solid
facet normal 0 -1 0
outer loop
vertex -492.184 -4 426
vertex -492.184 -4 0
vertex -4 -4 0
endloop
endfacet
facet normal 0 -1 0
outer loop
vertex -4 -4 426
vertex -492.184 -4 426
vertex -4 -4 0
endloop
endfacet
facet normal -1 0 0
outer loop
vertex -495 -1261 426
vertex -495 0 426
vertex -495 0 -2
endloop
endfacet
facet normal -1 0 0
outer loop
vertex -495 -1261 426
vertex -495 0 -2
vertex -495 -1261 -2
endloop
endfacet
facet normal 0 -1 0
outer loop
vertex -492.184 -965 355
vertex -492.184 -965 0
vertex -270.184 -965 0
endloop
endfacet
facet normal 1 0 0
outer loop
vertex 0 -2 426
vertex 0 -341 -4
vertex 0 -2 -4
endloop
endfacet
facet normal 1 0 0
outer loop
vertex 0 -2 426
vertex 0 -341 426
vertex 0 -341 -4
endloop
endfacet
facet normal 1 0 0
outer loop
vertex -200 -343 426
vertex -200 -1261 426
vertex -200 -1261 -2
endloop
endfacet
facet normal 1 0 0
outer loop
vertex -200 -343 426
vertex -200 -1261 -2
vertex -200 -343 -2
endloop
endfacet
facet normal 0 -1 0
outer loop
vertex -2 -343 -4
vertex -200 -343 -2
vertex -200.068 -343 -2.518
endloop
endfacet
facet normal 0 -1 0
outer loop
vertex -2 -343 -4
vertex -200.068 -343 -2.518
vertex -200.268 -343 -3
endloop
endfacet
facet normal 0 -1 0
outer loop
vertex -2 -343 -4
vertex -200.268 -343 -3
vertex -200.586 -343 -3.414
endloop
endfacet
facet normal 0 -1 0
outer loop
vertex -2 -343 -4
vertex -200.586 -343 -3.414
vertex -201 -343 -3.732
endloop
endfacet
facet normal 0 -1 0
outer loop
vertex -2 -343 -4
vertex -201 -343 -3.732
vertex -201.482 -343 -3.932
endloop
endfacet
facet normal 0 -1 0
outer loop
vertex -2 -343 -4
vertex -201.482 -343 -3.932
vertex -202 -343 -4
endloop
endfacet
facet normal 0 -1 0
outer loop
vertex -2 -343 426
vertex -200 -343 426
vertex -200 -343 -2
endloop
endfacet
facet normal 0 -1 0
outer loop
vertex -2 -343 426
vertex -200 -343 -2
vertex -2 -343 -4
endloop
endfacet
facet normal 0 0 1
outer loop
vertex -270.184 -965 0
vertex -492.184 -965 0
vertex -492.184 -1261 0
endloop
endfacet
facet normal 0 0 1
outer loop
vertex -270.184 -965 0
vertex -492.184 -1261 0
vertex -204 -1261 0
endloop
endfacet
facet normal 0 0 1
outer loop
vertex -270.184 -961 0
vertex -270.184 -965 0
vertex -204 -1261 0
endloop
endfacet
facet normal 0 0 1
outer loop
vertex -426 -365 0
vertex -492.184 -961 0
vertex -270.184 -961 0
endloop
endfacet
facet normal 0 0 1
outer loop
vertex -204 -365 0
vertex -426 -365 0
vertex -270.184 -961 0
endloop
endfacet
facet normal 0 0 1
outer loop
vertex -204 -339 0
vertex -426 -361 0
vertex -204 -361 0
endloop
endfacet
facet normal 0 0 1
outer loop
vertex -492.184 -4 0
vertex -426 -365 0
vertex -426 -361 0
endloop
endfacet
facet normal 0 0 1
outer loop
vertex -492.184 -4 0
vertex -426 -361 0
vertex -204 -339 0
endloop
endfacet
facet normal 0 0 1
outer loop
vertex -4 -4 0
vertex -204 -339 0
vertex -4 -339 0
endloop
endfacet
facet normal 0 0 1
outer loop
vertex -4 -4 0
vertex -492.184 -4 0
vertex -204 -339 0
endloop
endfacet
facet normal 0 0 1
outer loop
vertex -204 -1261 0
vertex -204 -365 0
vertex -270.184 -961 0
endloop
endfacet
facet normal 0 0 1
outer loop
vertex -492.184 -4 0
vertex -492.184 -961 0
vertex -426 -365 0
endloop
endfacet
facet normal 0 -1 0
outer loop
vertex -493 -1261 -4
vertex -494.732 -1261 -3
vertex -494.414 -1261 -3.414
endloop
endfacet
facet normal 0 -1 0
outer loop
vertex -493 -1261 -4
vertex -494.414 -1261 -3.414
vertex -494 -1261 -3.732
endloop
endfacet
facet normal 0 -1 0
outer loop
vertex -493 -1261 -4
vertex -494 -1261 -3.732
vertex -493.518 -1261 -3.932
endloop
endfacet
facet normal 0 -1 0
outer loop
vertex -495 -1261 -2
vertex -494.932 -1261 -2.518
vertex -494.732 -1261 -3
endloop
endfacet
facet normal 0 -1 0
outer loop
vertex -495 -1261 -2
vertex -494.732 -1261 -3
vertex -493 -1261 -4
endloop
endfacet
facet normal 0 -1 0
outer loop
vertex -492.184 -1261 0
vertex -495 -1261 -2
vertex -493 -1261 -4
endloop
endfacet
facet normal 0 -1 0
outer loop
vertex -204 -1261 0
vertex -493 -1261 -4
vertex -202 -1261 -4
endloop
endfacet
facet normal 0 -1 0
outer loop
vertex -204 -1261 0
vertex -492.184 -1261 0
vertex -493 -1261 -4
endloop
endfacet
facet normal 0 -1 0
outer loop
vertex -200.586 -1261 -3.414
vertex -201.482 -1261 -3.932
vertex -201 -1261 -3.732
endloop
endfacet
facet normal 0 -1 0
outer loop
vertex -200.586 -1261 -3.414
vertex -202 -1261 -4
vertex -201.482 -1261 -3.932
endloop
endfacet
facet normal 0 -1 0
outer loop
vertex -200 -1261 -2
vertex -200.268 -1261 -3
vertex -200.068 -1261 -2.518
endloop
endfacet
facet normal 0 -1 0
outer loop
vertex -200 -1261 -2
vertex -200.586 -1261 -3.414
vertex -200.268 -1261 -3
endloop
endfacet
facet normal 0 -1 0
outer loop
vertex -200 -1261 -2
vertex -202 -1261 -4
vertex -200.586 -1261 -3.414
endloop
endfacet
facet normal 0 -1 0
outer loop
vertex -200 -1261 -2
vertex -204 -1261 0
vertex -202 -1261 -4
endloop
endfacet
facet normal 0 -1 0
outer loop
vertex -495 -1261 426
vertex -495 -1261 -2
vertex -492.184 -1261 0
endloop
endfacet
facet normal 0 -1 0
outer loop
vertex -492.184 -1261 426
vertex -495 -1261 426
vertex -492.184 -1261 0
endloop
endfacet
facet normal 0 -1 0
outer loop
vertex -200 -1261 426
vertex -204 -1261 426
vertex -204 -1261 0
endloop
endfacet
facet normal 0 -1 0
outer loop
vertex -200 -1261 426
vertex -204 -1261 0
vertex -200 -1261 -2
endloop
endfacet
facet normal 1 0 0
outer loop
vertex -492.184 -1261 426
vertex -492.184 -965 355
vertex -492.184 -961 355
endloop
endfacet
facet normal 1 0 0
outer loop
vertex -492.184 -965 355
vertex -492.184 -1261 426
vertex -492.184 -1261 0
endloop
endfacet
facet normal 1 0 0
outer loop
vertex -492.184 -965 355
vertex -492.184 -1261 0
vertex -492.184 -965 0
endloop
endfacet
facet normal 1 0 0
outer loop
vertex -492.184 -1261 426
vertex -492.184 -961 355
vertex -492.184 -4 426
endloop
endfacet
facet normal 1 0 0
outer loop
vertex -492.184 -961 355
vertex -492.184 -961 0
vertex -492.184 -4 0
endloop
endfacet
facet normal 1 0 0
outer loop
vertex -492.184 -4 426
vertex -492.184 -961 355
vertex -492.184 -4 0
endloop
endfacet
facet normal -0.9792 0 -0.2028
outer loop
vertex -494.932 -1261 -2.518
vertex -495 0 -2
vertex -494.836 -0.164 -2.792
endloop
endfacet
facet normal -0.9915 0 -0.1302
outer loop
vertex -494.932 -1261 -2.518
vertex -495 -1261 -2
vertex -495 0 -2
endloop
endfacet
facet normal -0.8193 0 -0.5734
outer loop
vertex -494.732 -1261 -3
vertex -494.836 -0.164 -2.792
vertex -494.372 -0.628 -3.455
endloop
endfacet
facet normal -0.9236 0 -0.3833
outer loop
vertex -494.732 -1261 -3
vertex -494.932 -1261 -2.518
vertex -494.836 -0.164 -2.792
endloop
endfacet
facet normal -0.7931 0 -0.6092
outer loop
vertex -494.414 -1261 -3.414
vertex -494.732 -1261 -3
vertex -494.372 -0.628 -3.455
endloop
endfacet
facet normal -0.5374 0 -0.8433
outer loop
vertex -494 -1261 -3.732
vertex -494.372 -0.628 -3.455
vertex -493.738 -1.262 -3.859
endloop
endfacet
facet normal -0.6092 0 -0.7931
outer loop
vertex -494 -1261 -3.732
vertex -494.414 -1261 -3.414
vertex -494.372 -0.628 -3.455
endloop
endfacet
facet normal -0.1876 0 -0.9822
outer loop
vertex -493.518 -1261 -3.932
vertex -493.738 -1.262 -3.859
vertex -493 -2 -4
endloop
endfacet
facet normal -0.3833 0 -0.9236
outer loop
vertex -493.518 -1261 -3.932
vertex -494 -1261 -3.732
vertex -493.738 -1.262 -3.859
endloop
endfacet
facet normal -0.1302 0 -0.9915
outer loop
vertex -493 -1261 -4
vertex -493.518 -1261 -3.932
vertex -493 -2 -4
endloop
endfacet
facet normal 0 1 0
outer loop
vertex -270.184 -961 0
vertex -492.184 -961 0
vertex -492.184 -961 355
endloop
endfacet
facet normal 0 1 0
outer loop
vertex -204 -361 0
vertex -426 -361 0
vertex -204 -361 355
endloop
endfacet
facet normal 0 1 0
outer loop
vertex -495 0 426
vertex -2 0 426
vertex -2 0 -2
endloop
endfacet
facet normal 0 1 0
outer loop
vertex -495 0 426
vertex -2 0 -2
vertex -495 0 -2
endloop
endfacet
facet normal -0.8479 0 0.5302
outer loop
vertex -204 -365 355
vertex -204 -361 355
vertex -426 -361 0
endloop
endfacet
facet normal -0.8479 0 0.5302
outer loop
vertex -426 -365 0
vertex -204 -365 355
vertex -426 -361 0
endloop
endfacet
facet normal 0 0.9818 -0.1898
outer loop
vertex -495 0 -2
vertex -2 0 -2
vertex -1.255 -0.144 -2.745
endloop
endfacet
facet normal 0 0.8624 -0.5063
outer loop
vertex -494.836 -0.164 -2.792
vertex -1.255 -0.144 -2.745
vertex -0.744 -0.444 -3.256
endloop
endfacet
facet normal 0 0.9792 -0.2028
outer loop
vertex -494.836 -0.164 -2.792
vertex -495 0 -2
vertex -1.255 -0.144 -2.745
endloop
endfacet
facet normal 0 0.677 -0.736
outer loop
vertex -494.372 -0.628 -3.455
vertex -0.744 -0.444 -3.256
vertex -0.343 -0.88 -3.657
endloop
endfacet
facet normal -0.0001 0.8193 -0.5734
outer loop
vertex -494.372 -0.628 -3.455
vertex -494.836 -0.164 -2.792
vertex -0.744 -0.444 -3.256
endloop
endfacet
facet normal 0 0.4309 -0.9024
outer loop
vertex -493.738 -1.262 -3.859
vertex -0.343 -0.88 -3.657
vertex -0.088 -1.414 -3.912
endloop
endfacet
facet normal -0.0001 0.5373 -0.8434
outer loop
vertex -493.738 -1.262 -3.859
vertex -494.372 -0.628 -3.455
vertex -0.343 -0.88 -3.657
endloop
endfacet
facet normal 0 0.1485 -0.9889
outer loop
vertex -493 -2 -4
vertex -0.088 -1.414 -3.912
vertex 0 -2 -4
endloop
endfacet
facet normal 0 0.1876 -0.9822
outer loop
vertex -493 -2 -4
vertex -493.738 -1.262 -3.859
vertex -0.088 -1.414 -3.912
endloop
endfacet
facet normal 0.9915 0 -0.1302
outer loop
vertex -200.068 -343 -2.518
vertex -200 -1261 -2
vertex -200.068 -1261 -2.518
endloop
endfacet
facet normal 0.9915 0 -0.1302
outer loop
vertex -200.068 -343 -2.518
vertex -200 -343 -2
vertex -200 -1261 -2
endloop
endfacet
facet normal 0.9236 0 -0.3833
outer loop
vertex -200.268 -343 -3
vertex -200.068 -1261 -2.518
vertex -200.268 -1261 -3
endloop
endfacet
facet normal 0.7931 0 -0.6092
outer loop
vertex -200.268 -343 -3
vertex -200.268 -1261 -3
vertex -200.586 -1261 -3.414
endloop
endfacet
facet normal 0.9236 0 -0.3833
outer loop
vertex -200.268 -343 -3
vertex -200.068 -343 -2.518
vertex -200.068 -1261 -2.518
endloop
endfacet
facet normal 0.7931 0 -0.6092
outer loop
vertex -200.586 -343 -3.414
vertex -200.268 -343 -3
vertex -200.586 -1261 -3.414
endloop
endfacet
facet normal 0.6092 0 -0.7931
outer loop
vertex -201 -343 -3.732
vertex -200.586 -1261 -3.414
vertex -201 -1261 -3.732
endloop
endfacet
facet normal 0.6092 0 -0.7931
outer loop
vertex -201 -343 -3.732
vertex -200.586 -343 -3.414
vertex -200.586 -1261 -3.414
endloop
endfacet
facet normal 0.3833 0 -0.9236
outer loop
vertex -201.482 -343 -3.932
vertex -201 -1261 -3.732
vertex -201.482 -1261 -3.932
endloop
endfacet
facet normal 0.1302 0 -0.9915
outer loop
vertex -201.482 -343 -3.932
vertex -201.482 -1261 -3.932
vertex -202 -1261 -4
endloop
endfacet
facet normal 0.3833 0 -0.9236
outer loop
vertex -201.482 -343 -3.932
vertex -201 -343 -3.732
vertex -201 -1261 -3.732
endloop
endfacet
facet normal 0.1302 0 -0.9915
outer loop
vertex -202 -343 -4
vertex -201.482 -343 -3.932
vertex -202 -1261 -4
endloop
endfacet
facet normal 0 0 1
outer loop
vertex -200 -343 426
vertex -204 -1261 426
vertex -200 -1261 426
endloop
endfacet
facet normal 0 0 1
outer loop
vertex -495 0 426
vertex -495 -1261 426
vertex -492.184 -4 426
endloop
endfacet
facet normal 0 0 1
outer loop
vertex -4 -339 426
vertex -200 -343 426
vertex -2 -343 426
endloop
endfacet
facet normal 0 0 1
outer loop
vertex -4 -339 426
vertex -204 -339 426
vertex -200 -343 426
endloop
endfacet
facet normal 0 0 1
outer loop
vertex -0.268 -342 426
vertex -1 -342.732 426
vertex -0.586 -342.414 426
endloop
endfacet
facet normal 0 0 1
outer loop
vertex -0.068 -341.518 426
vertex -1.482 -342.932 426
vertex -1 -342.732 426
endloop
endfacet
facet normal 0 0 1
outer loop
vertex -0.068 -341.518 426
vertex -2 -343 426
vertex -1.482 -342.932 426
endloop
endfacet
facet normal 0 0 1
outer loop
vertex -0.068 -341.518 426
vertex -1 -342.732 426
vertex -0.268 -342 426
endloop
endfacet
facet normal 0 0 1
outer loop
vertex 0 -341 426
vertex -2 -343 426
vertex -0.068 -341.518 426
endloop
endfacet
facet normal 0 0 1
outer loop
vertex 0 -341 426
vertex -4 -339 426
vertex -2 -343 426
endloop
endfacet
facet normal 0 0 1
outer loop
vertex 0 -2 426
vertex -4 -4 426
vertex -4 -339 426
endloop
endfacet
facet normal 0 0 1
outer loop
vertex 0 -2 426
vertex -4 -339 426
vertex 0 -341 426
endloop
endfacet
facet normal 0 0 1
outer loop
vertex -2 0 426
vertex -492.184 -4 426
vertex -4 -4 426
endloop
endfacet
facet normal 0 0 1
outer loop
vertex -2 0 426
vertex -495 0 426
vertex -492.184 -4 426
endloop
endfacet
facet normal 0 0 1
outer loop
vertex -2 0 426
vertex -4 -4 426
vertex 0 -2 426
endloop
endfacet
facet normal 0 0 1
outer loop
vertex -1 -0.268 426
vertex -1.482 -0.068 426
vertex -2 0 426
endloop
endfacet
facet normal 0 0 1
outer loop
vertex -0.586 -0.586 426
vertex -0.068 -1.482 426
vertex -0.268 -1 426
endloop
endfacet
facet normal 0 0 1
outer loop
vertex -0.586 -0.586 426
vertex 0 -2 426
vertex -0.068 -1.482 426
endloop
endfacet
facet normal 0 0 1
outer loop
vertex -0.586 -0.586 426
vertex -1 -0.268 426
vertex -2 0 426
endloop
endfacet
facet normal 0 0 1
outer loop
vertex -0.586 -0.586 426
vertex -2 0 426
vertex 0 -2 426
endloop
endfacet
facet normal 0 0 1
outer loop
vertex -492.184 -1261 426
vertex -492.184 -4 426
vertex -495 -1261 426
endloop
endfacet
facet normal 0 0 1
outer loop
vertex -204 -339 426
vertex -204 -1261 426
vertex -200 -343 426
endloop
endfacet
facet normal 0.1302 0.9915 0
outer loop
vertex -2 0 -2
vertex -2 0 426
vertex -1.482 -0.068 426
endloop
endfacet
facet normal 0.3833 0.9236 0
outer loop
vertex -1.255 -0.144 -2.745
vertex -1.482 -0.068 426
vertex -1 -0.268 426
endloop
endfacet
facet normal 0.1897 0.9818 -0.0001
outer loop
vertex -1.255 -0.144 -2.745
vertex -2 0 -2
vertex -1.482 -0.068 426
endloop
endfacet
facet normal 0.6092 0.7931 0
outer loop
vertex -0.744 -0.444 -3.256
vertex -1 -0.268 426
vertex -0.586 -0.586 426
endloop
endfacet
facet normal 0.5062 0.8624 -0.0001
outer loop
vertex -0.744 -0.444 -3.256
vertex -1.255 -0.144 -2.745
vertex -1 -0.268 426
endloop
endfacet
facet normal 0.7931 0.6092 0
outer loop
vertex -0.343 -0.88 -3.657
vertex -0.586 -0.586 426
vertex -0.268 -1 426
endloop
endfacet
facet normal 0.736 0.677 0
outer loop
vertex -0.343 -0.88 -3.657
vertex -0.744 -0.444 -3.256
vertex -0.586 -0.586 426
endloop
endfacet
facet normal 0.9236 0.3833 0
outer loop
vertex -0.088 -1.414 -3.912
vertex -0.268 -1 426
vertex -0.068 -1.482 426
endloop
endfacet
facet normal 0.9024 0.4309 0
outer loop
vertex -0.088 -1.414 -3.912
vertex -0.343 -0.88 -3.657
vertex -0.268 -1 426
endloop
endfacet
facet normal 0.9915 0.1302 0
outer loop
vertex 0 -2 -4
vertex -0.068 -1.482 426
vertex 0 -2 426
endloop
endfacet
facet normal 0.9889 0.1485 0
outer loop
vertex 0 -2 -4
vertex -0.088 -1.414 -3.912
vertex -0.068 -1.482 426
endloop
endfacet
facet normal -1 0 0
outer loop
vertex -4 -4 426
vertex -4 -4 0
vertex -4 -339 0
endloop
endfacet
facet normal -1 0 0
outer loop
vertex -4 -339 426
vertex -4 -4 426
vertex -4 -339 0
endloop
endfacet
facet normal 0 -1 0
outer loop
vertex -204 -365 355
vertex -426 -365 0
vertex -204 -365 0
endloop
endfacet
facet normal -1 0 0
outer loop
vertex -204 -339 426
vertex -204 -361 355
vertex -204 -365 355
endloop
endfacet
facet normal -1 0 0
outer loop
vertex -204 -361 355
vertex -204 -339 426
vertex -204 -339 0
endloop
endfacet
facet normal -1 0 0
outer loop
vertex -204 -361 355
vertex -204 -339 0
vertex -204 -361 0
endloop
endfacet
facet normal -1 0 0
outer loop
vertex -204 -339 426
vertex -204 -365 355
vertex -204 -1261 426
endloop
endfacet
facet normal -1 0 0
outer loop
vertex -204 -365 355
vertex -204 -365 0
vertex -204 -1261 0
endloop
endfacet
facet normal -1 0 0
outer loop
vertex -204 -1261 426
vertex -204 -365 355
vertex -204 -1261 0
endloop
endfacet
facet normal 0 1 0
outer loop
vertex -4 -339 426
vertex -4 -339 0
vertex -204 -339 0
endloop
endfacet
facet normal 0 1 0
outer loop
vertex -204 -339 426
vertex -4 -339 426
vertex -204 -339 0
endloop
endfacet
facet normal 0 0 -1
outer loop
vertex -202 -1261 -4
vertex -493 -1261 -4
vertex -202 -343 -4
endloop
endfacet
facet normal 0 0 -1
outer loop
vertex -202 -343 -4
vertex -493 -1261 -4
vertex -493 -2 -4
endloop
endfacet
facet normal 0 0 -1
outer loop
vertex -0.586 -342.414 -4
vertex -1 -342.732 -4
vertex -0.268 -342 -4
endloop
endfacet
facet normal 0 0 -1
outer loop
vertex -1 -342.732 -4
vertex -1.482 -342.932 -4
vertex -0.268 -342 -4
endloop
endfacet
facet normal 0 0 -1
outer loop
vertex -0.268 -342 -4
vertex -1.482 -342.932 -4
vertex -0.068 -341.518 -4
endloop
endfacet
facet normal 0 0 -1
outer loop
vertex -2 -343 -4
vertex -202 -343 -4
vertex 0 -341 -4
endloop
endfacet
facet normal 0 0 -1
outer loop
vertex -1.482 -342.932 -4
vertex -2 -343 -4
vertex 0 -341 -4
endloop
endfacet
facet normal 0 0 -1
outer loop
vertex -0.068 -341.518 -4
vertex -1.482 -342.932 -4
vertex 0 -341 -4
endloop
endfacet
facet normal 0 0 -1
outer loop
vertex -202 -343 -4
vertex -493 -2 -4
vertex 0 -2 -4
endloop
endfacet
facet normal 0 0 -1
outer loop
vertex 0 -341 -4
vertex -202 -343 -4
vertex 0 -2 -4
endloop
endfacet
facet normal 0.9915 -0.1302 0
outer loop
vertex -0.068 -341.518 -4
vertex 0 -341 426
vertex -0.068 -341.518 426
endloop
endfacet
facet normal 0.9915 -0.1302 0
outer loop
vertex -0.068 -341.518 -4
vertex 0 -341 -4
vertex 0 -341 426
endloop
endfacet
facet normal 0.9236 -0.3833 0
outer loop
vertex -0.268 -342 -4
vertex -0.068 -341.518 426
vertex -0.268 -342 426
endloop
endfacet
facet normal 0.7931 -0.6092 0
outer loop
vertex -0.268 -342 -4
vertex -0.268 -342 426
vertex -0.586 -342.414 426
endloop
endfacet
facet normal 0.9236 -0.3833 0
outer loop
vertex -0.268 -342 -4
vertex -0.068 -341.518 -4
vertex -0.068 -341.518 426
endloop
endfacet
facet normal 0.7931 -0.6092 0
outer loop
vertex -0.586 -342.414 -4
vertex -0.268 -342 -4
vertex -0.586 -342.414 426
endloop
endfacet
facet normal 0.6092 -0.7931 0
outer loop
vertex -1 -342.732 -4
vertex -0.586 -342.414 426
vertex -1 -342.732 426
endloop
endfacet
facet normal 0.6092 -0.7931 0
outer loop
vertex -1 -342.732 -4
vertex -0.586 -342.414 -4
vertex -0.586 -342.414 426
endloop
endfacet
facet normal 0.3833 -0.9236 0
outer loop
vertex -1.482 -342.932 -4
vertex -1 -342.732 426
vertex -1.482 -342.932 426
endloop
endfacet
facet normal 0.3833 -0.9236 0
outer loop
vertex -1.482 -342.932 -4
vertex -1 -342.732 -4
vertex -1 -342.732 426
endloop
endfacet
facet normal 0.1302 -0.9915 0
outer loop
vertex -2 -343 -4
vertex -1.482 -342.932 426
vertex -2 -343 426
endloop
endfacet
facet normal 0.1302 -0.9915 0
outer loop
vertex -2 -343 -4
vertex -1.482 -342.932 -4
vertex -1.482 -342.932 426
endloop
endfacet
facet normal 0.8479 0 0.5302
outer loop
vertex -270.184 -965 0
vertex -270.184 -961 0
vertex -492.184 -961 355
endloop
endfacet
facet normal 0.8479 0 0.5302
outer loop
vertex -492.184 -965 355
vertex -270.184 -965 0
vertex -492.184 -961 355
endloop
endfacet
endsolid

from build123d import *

# Parameters (mm, degrees)
F1_DEPTH  = 426
F3_DEPTH  = 4
F4_R      = 2
F7_DEPTH  = 4
F10_DEPTH = 4


# Not quite as in the source:
# - a feature names something its author has since deleted; it is built from what else it names


with BuildPart() as f1:
    # F0 (on Top) → F1 (new body)
    with BuildSketch(Plane.XY):
        Polygon((-200, -343), (0, -343), (0, 0), (-495, 0), (-495, -1261), (-492.1838745495, -1261), (-492.1838745495, -4), (-4, -4), (-4, -339), (-204, -339), (-204, -1261), (-200, -1261), align=None)
    extrude(amount=F1_DEPTH)

    # F2 (on Top) → F3 (join)
    with BuildSketch(Plane.XY):
        Polygon((0, 0), (-495, 0), (-495, -1261), (-200, -1261), (-200, -343), (0, -343), align=None)
    extrude(amount=-F3_DEPTH)

    # F4
    f4_edges = [f1.edges().sort_by_distance(p)[0] for p in [
        (-200, -802, -4),
        (-495, -630.5, -4),
        (-247.5, 0, -4),
        (0, -343, 211),
        (0, 0, 211),
    ]]
    fillet(f4_edges, radius=F4_R)

    # F6 (on offset) → F7 (join)
    with BuildSketch(Plane.XZ.offset(961)):
        Polygon((-492.1838745495, 355), (-492.1838745495, 0), (-270.1838745495, 0), align=None)
    extrude(amount=F7_DEPTH)

    # F9 (on offset) → F10 (join)
    with BuildSketch(Plane.XZ.offset(361)):
        Polygon((-204, 355), (-426, 0), (-204, 0), align=None)
    extrude(amount=F10_DEPTH)


solid = f1.part
